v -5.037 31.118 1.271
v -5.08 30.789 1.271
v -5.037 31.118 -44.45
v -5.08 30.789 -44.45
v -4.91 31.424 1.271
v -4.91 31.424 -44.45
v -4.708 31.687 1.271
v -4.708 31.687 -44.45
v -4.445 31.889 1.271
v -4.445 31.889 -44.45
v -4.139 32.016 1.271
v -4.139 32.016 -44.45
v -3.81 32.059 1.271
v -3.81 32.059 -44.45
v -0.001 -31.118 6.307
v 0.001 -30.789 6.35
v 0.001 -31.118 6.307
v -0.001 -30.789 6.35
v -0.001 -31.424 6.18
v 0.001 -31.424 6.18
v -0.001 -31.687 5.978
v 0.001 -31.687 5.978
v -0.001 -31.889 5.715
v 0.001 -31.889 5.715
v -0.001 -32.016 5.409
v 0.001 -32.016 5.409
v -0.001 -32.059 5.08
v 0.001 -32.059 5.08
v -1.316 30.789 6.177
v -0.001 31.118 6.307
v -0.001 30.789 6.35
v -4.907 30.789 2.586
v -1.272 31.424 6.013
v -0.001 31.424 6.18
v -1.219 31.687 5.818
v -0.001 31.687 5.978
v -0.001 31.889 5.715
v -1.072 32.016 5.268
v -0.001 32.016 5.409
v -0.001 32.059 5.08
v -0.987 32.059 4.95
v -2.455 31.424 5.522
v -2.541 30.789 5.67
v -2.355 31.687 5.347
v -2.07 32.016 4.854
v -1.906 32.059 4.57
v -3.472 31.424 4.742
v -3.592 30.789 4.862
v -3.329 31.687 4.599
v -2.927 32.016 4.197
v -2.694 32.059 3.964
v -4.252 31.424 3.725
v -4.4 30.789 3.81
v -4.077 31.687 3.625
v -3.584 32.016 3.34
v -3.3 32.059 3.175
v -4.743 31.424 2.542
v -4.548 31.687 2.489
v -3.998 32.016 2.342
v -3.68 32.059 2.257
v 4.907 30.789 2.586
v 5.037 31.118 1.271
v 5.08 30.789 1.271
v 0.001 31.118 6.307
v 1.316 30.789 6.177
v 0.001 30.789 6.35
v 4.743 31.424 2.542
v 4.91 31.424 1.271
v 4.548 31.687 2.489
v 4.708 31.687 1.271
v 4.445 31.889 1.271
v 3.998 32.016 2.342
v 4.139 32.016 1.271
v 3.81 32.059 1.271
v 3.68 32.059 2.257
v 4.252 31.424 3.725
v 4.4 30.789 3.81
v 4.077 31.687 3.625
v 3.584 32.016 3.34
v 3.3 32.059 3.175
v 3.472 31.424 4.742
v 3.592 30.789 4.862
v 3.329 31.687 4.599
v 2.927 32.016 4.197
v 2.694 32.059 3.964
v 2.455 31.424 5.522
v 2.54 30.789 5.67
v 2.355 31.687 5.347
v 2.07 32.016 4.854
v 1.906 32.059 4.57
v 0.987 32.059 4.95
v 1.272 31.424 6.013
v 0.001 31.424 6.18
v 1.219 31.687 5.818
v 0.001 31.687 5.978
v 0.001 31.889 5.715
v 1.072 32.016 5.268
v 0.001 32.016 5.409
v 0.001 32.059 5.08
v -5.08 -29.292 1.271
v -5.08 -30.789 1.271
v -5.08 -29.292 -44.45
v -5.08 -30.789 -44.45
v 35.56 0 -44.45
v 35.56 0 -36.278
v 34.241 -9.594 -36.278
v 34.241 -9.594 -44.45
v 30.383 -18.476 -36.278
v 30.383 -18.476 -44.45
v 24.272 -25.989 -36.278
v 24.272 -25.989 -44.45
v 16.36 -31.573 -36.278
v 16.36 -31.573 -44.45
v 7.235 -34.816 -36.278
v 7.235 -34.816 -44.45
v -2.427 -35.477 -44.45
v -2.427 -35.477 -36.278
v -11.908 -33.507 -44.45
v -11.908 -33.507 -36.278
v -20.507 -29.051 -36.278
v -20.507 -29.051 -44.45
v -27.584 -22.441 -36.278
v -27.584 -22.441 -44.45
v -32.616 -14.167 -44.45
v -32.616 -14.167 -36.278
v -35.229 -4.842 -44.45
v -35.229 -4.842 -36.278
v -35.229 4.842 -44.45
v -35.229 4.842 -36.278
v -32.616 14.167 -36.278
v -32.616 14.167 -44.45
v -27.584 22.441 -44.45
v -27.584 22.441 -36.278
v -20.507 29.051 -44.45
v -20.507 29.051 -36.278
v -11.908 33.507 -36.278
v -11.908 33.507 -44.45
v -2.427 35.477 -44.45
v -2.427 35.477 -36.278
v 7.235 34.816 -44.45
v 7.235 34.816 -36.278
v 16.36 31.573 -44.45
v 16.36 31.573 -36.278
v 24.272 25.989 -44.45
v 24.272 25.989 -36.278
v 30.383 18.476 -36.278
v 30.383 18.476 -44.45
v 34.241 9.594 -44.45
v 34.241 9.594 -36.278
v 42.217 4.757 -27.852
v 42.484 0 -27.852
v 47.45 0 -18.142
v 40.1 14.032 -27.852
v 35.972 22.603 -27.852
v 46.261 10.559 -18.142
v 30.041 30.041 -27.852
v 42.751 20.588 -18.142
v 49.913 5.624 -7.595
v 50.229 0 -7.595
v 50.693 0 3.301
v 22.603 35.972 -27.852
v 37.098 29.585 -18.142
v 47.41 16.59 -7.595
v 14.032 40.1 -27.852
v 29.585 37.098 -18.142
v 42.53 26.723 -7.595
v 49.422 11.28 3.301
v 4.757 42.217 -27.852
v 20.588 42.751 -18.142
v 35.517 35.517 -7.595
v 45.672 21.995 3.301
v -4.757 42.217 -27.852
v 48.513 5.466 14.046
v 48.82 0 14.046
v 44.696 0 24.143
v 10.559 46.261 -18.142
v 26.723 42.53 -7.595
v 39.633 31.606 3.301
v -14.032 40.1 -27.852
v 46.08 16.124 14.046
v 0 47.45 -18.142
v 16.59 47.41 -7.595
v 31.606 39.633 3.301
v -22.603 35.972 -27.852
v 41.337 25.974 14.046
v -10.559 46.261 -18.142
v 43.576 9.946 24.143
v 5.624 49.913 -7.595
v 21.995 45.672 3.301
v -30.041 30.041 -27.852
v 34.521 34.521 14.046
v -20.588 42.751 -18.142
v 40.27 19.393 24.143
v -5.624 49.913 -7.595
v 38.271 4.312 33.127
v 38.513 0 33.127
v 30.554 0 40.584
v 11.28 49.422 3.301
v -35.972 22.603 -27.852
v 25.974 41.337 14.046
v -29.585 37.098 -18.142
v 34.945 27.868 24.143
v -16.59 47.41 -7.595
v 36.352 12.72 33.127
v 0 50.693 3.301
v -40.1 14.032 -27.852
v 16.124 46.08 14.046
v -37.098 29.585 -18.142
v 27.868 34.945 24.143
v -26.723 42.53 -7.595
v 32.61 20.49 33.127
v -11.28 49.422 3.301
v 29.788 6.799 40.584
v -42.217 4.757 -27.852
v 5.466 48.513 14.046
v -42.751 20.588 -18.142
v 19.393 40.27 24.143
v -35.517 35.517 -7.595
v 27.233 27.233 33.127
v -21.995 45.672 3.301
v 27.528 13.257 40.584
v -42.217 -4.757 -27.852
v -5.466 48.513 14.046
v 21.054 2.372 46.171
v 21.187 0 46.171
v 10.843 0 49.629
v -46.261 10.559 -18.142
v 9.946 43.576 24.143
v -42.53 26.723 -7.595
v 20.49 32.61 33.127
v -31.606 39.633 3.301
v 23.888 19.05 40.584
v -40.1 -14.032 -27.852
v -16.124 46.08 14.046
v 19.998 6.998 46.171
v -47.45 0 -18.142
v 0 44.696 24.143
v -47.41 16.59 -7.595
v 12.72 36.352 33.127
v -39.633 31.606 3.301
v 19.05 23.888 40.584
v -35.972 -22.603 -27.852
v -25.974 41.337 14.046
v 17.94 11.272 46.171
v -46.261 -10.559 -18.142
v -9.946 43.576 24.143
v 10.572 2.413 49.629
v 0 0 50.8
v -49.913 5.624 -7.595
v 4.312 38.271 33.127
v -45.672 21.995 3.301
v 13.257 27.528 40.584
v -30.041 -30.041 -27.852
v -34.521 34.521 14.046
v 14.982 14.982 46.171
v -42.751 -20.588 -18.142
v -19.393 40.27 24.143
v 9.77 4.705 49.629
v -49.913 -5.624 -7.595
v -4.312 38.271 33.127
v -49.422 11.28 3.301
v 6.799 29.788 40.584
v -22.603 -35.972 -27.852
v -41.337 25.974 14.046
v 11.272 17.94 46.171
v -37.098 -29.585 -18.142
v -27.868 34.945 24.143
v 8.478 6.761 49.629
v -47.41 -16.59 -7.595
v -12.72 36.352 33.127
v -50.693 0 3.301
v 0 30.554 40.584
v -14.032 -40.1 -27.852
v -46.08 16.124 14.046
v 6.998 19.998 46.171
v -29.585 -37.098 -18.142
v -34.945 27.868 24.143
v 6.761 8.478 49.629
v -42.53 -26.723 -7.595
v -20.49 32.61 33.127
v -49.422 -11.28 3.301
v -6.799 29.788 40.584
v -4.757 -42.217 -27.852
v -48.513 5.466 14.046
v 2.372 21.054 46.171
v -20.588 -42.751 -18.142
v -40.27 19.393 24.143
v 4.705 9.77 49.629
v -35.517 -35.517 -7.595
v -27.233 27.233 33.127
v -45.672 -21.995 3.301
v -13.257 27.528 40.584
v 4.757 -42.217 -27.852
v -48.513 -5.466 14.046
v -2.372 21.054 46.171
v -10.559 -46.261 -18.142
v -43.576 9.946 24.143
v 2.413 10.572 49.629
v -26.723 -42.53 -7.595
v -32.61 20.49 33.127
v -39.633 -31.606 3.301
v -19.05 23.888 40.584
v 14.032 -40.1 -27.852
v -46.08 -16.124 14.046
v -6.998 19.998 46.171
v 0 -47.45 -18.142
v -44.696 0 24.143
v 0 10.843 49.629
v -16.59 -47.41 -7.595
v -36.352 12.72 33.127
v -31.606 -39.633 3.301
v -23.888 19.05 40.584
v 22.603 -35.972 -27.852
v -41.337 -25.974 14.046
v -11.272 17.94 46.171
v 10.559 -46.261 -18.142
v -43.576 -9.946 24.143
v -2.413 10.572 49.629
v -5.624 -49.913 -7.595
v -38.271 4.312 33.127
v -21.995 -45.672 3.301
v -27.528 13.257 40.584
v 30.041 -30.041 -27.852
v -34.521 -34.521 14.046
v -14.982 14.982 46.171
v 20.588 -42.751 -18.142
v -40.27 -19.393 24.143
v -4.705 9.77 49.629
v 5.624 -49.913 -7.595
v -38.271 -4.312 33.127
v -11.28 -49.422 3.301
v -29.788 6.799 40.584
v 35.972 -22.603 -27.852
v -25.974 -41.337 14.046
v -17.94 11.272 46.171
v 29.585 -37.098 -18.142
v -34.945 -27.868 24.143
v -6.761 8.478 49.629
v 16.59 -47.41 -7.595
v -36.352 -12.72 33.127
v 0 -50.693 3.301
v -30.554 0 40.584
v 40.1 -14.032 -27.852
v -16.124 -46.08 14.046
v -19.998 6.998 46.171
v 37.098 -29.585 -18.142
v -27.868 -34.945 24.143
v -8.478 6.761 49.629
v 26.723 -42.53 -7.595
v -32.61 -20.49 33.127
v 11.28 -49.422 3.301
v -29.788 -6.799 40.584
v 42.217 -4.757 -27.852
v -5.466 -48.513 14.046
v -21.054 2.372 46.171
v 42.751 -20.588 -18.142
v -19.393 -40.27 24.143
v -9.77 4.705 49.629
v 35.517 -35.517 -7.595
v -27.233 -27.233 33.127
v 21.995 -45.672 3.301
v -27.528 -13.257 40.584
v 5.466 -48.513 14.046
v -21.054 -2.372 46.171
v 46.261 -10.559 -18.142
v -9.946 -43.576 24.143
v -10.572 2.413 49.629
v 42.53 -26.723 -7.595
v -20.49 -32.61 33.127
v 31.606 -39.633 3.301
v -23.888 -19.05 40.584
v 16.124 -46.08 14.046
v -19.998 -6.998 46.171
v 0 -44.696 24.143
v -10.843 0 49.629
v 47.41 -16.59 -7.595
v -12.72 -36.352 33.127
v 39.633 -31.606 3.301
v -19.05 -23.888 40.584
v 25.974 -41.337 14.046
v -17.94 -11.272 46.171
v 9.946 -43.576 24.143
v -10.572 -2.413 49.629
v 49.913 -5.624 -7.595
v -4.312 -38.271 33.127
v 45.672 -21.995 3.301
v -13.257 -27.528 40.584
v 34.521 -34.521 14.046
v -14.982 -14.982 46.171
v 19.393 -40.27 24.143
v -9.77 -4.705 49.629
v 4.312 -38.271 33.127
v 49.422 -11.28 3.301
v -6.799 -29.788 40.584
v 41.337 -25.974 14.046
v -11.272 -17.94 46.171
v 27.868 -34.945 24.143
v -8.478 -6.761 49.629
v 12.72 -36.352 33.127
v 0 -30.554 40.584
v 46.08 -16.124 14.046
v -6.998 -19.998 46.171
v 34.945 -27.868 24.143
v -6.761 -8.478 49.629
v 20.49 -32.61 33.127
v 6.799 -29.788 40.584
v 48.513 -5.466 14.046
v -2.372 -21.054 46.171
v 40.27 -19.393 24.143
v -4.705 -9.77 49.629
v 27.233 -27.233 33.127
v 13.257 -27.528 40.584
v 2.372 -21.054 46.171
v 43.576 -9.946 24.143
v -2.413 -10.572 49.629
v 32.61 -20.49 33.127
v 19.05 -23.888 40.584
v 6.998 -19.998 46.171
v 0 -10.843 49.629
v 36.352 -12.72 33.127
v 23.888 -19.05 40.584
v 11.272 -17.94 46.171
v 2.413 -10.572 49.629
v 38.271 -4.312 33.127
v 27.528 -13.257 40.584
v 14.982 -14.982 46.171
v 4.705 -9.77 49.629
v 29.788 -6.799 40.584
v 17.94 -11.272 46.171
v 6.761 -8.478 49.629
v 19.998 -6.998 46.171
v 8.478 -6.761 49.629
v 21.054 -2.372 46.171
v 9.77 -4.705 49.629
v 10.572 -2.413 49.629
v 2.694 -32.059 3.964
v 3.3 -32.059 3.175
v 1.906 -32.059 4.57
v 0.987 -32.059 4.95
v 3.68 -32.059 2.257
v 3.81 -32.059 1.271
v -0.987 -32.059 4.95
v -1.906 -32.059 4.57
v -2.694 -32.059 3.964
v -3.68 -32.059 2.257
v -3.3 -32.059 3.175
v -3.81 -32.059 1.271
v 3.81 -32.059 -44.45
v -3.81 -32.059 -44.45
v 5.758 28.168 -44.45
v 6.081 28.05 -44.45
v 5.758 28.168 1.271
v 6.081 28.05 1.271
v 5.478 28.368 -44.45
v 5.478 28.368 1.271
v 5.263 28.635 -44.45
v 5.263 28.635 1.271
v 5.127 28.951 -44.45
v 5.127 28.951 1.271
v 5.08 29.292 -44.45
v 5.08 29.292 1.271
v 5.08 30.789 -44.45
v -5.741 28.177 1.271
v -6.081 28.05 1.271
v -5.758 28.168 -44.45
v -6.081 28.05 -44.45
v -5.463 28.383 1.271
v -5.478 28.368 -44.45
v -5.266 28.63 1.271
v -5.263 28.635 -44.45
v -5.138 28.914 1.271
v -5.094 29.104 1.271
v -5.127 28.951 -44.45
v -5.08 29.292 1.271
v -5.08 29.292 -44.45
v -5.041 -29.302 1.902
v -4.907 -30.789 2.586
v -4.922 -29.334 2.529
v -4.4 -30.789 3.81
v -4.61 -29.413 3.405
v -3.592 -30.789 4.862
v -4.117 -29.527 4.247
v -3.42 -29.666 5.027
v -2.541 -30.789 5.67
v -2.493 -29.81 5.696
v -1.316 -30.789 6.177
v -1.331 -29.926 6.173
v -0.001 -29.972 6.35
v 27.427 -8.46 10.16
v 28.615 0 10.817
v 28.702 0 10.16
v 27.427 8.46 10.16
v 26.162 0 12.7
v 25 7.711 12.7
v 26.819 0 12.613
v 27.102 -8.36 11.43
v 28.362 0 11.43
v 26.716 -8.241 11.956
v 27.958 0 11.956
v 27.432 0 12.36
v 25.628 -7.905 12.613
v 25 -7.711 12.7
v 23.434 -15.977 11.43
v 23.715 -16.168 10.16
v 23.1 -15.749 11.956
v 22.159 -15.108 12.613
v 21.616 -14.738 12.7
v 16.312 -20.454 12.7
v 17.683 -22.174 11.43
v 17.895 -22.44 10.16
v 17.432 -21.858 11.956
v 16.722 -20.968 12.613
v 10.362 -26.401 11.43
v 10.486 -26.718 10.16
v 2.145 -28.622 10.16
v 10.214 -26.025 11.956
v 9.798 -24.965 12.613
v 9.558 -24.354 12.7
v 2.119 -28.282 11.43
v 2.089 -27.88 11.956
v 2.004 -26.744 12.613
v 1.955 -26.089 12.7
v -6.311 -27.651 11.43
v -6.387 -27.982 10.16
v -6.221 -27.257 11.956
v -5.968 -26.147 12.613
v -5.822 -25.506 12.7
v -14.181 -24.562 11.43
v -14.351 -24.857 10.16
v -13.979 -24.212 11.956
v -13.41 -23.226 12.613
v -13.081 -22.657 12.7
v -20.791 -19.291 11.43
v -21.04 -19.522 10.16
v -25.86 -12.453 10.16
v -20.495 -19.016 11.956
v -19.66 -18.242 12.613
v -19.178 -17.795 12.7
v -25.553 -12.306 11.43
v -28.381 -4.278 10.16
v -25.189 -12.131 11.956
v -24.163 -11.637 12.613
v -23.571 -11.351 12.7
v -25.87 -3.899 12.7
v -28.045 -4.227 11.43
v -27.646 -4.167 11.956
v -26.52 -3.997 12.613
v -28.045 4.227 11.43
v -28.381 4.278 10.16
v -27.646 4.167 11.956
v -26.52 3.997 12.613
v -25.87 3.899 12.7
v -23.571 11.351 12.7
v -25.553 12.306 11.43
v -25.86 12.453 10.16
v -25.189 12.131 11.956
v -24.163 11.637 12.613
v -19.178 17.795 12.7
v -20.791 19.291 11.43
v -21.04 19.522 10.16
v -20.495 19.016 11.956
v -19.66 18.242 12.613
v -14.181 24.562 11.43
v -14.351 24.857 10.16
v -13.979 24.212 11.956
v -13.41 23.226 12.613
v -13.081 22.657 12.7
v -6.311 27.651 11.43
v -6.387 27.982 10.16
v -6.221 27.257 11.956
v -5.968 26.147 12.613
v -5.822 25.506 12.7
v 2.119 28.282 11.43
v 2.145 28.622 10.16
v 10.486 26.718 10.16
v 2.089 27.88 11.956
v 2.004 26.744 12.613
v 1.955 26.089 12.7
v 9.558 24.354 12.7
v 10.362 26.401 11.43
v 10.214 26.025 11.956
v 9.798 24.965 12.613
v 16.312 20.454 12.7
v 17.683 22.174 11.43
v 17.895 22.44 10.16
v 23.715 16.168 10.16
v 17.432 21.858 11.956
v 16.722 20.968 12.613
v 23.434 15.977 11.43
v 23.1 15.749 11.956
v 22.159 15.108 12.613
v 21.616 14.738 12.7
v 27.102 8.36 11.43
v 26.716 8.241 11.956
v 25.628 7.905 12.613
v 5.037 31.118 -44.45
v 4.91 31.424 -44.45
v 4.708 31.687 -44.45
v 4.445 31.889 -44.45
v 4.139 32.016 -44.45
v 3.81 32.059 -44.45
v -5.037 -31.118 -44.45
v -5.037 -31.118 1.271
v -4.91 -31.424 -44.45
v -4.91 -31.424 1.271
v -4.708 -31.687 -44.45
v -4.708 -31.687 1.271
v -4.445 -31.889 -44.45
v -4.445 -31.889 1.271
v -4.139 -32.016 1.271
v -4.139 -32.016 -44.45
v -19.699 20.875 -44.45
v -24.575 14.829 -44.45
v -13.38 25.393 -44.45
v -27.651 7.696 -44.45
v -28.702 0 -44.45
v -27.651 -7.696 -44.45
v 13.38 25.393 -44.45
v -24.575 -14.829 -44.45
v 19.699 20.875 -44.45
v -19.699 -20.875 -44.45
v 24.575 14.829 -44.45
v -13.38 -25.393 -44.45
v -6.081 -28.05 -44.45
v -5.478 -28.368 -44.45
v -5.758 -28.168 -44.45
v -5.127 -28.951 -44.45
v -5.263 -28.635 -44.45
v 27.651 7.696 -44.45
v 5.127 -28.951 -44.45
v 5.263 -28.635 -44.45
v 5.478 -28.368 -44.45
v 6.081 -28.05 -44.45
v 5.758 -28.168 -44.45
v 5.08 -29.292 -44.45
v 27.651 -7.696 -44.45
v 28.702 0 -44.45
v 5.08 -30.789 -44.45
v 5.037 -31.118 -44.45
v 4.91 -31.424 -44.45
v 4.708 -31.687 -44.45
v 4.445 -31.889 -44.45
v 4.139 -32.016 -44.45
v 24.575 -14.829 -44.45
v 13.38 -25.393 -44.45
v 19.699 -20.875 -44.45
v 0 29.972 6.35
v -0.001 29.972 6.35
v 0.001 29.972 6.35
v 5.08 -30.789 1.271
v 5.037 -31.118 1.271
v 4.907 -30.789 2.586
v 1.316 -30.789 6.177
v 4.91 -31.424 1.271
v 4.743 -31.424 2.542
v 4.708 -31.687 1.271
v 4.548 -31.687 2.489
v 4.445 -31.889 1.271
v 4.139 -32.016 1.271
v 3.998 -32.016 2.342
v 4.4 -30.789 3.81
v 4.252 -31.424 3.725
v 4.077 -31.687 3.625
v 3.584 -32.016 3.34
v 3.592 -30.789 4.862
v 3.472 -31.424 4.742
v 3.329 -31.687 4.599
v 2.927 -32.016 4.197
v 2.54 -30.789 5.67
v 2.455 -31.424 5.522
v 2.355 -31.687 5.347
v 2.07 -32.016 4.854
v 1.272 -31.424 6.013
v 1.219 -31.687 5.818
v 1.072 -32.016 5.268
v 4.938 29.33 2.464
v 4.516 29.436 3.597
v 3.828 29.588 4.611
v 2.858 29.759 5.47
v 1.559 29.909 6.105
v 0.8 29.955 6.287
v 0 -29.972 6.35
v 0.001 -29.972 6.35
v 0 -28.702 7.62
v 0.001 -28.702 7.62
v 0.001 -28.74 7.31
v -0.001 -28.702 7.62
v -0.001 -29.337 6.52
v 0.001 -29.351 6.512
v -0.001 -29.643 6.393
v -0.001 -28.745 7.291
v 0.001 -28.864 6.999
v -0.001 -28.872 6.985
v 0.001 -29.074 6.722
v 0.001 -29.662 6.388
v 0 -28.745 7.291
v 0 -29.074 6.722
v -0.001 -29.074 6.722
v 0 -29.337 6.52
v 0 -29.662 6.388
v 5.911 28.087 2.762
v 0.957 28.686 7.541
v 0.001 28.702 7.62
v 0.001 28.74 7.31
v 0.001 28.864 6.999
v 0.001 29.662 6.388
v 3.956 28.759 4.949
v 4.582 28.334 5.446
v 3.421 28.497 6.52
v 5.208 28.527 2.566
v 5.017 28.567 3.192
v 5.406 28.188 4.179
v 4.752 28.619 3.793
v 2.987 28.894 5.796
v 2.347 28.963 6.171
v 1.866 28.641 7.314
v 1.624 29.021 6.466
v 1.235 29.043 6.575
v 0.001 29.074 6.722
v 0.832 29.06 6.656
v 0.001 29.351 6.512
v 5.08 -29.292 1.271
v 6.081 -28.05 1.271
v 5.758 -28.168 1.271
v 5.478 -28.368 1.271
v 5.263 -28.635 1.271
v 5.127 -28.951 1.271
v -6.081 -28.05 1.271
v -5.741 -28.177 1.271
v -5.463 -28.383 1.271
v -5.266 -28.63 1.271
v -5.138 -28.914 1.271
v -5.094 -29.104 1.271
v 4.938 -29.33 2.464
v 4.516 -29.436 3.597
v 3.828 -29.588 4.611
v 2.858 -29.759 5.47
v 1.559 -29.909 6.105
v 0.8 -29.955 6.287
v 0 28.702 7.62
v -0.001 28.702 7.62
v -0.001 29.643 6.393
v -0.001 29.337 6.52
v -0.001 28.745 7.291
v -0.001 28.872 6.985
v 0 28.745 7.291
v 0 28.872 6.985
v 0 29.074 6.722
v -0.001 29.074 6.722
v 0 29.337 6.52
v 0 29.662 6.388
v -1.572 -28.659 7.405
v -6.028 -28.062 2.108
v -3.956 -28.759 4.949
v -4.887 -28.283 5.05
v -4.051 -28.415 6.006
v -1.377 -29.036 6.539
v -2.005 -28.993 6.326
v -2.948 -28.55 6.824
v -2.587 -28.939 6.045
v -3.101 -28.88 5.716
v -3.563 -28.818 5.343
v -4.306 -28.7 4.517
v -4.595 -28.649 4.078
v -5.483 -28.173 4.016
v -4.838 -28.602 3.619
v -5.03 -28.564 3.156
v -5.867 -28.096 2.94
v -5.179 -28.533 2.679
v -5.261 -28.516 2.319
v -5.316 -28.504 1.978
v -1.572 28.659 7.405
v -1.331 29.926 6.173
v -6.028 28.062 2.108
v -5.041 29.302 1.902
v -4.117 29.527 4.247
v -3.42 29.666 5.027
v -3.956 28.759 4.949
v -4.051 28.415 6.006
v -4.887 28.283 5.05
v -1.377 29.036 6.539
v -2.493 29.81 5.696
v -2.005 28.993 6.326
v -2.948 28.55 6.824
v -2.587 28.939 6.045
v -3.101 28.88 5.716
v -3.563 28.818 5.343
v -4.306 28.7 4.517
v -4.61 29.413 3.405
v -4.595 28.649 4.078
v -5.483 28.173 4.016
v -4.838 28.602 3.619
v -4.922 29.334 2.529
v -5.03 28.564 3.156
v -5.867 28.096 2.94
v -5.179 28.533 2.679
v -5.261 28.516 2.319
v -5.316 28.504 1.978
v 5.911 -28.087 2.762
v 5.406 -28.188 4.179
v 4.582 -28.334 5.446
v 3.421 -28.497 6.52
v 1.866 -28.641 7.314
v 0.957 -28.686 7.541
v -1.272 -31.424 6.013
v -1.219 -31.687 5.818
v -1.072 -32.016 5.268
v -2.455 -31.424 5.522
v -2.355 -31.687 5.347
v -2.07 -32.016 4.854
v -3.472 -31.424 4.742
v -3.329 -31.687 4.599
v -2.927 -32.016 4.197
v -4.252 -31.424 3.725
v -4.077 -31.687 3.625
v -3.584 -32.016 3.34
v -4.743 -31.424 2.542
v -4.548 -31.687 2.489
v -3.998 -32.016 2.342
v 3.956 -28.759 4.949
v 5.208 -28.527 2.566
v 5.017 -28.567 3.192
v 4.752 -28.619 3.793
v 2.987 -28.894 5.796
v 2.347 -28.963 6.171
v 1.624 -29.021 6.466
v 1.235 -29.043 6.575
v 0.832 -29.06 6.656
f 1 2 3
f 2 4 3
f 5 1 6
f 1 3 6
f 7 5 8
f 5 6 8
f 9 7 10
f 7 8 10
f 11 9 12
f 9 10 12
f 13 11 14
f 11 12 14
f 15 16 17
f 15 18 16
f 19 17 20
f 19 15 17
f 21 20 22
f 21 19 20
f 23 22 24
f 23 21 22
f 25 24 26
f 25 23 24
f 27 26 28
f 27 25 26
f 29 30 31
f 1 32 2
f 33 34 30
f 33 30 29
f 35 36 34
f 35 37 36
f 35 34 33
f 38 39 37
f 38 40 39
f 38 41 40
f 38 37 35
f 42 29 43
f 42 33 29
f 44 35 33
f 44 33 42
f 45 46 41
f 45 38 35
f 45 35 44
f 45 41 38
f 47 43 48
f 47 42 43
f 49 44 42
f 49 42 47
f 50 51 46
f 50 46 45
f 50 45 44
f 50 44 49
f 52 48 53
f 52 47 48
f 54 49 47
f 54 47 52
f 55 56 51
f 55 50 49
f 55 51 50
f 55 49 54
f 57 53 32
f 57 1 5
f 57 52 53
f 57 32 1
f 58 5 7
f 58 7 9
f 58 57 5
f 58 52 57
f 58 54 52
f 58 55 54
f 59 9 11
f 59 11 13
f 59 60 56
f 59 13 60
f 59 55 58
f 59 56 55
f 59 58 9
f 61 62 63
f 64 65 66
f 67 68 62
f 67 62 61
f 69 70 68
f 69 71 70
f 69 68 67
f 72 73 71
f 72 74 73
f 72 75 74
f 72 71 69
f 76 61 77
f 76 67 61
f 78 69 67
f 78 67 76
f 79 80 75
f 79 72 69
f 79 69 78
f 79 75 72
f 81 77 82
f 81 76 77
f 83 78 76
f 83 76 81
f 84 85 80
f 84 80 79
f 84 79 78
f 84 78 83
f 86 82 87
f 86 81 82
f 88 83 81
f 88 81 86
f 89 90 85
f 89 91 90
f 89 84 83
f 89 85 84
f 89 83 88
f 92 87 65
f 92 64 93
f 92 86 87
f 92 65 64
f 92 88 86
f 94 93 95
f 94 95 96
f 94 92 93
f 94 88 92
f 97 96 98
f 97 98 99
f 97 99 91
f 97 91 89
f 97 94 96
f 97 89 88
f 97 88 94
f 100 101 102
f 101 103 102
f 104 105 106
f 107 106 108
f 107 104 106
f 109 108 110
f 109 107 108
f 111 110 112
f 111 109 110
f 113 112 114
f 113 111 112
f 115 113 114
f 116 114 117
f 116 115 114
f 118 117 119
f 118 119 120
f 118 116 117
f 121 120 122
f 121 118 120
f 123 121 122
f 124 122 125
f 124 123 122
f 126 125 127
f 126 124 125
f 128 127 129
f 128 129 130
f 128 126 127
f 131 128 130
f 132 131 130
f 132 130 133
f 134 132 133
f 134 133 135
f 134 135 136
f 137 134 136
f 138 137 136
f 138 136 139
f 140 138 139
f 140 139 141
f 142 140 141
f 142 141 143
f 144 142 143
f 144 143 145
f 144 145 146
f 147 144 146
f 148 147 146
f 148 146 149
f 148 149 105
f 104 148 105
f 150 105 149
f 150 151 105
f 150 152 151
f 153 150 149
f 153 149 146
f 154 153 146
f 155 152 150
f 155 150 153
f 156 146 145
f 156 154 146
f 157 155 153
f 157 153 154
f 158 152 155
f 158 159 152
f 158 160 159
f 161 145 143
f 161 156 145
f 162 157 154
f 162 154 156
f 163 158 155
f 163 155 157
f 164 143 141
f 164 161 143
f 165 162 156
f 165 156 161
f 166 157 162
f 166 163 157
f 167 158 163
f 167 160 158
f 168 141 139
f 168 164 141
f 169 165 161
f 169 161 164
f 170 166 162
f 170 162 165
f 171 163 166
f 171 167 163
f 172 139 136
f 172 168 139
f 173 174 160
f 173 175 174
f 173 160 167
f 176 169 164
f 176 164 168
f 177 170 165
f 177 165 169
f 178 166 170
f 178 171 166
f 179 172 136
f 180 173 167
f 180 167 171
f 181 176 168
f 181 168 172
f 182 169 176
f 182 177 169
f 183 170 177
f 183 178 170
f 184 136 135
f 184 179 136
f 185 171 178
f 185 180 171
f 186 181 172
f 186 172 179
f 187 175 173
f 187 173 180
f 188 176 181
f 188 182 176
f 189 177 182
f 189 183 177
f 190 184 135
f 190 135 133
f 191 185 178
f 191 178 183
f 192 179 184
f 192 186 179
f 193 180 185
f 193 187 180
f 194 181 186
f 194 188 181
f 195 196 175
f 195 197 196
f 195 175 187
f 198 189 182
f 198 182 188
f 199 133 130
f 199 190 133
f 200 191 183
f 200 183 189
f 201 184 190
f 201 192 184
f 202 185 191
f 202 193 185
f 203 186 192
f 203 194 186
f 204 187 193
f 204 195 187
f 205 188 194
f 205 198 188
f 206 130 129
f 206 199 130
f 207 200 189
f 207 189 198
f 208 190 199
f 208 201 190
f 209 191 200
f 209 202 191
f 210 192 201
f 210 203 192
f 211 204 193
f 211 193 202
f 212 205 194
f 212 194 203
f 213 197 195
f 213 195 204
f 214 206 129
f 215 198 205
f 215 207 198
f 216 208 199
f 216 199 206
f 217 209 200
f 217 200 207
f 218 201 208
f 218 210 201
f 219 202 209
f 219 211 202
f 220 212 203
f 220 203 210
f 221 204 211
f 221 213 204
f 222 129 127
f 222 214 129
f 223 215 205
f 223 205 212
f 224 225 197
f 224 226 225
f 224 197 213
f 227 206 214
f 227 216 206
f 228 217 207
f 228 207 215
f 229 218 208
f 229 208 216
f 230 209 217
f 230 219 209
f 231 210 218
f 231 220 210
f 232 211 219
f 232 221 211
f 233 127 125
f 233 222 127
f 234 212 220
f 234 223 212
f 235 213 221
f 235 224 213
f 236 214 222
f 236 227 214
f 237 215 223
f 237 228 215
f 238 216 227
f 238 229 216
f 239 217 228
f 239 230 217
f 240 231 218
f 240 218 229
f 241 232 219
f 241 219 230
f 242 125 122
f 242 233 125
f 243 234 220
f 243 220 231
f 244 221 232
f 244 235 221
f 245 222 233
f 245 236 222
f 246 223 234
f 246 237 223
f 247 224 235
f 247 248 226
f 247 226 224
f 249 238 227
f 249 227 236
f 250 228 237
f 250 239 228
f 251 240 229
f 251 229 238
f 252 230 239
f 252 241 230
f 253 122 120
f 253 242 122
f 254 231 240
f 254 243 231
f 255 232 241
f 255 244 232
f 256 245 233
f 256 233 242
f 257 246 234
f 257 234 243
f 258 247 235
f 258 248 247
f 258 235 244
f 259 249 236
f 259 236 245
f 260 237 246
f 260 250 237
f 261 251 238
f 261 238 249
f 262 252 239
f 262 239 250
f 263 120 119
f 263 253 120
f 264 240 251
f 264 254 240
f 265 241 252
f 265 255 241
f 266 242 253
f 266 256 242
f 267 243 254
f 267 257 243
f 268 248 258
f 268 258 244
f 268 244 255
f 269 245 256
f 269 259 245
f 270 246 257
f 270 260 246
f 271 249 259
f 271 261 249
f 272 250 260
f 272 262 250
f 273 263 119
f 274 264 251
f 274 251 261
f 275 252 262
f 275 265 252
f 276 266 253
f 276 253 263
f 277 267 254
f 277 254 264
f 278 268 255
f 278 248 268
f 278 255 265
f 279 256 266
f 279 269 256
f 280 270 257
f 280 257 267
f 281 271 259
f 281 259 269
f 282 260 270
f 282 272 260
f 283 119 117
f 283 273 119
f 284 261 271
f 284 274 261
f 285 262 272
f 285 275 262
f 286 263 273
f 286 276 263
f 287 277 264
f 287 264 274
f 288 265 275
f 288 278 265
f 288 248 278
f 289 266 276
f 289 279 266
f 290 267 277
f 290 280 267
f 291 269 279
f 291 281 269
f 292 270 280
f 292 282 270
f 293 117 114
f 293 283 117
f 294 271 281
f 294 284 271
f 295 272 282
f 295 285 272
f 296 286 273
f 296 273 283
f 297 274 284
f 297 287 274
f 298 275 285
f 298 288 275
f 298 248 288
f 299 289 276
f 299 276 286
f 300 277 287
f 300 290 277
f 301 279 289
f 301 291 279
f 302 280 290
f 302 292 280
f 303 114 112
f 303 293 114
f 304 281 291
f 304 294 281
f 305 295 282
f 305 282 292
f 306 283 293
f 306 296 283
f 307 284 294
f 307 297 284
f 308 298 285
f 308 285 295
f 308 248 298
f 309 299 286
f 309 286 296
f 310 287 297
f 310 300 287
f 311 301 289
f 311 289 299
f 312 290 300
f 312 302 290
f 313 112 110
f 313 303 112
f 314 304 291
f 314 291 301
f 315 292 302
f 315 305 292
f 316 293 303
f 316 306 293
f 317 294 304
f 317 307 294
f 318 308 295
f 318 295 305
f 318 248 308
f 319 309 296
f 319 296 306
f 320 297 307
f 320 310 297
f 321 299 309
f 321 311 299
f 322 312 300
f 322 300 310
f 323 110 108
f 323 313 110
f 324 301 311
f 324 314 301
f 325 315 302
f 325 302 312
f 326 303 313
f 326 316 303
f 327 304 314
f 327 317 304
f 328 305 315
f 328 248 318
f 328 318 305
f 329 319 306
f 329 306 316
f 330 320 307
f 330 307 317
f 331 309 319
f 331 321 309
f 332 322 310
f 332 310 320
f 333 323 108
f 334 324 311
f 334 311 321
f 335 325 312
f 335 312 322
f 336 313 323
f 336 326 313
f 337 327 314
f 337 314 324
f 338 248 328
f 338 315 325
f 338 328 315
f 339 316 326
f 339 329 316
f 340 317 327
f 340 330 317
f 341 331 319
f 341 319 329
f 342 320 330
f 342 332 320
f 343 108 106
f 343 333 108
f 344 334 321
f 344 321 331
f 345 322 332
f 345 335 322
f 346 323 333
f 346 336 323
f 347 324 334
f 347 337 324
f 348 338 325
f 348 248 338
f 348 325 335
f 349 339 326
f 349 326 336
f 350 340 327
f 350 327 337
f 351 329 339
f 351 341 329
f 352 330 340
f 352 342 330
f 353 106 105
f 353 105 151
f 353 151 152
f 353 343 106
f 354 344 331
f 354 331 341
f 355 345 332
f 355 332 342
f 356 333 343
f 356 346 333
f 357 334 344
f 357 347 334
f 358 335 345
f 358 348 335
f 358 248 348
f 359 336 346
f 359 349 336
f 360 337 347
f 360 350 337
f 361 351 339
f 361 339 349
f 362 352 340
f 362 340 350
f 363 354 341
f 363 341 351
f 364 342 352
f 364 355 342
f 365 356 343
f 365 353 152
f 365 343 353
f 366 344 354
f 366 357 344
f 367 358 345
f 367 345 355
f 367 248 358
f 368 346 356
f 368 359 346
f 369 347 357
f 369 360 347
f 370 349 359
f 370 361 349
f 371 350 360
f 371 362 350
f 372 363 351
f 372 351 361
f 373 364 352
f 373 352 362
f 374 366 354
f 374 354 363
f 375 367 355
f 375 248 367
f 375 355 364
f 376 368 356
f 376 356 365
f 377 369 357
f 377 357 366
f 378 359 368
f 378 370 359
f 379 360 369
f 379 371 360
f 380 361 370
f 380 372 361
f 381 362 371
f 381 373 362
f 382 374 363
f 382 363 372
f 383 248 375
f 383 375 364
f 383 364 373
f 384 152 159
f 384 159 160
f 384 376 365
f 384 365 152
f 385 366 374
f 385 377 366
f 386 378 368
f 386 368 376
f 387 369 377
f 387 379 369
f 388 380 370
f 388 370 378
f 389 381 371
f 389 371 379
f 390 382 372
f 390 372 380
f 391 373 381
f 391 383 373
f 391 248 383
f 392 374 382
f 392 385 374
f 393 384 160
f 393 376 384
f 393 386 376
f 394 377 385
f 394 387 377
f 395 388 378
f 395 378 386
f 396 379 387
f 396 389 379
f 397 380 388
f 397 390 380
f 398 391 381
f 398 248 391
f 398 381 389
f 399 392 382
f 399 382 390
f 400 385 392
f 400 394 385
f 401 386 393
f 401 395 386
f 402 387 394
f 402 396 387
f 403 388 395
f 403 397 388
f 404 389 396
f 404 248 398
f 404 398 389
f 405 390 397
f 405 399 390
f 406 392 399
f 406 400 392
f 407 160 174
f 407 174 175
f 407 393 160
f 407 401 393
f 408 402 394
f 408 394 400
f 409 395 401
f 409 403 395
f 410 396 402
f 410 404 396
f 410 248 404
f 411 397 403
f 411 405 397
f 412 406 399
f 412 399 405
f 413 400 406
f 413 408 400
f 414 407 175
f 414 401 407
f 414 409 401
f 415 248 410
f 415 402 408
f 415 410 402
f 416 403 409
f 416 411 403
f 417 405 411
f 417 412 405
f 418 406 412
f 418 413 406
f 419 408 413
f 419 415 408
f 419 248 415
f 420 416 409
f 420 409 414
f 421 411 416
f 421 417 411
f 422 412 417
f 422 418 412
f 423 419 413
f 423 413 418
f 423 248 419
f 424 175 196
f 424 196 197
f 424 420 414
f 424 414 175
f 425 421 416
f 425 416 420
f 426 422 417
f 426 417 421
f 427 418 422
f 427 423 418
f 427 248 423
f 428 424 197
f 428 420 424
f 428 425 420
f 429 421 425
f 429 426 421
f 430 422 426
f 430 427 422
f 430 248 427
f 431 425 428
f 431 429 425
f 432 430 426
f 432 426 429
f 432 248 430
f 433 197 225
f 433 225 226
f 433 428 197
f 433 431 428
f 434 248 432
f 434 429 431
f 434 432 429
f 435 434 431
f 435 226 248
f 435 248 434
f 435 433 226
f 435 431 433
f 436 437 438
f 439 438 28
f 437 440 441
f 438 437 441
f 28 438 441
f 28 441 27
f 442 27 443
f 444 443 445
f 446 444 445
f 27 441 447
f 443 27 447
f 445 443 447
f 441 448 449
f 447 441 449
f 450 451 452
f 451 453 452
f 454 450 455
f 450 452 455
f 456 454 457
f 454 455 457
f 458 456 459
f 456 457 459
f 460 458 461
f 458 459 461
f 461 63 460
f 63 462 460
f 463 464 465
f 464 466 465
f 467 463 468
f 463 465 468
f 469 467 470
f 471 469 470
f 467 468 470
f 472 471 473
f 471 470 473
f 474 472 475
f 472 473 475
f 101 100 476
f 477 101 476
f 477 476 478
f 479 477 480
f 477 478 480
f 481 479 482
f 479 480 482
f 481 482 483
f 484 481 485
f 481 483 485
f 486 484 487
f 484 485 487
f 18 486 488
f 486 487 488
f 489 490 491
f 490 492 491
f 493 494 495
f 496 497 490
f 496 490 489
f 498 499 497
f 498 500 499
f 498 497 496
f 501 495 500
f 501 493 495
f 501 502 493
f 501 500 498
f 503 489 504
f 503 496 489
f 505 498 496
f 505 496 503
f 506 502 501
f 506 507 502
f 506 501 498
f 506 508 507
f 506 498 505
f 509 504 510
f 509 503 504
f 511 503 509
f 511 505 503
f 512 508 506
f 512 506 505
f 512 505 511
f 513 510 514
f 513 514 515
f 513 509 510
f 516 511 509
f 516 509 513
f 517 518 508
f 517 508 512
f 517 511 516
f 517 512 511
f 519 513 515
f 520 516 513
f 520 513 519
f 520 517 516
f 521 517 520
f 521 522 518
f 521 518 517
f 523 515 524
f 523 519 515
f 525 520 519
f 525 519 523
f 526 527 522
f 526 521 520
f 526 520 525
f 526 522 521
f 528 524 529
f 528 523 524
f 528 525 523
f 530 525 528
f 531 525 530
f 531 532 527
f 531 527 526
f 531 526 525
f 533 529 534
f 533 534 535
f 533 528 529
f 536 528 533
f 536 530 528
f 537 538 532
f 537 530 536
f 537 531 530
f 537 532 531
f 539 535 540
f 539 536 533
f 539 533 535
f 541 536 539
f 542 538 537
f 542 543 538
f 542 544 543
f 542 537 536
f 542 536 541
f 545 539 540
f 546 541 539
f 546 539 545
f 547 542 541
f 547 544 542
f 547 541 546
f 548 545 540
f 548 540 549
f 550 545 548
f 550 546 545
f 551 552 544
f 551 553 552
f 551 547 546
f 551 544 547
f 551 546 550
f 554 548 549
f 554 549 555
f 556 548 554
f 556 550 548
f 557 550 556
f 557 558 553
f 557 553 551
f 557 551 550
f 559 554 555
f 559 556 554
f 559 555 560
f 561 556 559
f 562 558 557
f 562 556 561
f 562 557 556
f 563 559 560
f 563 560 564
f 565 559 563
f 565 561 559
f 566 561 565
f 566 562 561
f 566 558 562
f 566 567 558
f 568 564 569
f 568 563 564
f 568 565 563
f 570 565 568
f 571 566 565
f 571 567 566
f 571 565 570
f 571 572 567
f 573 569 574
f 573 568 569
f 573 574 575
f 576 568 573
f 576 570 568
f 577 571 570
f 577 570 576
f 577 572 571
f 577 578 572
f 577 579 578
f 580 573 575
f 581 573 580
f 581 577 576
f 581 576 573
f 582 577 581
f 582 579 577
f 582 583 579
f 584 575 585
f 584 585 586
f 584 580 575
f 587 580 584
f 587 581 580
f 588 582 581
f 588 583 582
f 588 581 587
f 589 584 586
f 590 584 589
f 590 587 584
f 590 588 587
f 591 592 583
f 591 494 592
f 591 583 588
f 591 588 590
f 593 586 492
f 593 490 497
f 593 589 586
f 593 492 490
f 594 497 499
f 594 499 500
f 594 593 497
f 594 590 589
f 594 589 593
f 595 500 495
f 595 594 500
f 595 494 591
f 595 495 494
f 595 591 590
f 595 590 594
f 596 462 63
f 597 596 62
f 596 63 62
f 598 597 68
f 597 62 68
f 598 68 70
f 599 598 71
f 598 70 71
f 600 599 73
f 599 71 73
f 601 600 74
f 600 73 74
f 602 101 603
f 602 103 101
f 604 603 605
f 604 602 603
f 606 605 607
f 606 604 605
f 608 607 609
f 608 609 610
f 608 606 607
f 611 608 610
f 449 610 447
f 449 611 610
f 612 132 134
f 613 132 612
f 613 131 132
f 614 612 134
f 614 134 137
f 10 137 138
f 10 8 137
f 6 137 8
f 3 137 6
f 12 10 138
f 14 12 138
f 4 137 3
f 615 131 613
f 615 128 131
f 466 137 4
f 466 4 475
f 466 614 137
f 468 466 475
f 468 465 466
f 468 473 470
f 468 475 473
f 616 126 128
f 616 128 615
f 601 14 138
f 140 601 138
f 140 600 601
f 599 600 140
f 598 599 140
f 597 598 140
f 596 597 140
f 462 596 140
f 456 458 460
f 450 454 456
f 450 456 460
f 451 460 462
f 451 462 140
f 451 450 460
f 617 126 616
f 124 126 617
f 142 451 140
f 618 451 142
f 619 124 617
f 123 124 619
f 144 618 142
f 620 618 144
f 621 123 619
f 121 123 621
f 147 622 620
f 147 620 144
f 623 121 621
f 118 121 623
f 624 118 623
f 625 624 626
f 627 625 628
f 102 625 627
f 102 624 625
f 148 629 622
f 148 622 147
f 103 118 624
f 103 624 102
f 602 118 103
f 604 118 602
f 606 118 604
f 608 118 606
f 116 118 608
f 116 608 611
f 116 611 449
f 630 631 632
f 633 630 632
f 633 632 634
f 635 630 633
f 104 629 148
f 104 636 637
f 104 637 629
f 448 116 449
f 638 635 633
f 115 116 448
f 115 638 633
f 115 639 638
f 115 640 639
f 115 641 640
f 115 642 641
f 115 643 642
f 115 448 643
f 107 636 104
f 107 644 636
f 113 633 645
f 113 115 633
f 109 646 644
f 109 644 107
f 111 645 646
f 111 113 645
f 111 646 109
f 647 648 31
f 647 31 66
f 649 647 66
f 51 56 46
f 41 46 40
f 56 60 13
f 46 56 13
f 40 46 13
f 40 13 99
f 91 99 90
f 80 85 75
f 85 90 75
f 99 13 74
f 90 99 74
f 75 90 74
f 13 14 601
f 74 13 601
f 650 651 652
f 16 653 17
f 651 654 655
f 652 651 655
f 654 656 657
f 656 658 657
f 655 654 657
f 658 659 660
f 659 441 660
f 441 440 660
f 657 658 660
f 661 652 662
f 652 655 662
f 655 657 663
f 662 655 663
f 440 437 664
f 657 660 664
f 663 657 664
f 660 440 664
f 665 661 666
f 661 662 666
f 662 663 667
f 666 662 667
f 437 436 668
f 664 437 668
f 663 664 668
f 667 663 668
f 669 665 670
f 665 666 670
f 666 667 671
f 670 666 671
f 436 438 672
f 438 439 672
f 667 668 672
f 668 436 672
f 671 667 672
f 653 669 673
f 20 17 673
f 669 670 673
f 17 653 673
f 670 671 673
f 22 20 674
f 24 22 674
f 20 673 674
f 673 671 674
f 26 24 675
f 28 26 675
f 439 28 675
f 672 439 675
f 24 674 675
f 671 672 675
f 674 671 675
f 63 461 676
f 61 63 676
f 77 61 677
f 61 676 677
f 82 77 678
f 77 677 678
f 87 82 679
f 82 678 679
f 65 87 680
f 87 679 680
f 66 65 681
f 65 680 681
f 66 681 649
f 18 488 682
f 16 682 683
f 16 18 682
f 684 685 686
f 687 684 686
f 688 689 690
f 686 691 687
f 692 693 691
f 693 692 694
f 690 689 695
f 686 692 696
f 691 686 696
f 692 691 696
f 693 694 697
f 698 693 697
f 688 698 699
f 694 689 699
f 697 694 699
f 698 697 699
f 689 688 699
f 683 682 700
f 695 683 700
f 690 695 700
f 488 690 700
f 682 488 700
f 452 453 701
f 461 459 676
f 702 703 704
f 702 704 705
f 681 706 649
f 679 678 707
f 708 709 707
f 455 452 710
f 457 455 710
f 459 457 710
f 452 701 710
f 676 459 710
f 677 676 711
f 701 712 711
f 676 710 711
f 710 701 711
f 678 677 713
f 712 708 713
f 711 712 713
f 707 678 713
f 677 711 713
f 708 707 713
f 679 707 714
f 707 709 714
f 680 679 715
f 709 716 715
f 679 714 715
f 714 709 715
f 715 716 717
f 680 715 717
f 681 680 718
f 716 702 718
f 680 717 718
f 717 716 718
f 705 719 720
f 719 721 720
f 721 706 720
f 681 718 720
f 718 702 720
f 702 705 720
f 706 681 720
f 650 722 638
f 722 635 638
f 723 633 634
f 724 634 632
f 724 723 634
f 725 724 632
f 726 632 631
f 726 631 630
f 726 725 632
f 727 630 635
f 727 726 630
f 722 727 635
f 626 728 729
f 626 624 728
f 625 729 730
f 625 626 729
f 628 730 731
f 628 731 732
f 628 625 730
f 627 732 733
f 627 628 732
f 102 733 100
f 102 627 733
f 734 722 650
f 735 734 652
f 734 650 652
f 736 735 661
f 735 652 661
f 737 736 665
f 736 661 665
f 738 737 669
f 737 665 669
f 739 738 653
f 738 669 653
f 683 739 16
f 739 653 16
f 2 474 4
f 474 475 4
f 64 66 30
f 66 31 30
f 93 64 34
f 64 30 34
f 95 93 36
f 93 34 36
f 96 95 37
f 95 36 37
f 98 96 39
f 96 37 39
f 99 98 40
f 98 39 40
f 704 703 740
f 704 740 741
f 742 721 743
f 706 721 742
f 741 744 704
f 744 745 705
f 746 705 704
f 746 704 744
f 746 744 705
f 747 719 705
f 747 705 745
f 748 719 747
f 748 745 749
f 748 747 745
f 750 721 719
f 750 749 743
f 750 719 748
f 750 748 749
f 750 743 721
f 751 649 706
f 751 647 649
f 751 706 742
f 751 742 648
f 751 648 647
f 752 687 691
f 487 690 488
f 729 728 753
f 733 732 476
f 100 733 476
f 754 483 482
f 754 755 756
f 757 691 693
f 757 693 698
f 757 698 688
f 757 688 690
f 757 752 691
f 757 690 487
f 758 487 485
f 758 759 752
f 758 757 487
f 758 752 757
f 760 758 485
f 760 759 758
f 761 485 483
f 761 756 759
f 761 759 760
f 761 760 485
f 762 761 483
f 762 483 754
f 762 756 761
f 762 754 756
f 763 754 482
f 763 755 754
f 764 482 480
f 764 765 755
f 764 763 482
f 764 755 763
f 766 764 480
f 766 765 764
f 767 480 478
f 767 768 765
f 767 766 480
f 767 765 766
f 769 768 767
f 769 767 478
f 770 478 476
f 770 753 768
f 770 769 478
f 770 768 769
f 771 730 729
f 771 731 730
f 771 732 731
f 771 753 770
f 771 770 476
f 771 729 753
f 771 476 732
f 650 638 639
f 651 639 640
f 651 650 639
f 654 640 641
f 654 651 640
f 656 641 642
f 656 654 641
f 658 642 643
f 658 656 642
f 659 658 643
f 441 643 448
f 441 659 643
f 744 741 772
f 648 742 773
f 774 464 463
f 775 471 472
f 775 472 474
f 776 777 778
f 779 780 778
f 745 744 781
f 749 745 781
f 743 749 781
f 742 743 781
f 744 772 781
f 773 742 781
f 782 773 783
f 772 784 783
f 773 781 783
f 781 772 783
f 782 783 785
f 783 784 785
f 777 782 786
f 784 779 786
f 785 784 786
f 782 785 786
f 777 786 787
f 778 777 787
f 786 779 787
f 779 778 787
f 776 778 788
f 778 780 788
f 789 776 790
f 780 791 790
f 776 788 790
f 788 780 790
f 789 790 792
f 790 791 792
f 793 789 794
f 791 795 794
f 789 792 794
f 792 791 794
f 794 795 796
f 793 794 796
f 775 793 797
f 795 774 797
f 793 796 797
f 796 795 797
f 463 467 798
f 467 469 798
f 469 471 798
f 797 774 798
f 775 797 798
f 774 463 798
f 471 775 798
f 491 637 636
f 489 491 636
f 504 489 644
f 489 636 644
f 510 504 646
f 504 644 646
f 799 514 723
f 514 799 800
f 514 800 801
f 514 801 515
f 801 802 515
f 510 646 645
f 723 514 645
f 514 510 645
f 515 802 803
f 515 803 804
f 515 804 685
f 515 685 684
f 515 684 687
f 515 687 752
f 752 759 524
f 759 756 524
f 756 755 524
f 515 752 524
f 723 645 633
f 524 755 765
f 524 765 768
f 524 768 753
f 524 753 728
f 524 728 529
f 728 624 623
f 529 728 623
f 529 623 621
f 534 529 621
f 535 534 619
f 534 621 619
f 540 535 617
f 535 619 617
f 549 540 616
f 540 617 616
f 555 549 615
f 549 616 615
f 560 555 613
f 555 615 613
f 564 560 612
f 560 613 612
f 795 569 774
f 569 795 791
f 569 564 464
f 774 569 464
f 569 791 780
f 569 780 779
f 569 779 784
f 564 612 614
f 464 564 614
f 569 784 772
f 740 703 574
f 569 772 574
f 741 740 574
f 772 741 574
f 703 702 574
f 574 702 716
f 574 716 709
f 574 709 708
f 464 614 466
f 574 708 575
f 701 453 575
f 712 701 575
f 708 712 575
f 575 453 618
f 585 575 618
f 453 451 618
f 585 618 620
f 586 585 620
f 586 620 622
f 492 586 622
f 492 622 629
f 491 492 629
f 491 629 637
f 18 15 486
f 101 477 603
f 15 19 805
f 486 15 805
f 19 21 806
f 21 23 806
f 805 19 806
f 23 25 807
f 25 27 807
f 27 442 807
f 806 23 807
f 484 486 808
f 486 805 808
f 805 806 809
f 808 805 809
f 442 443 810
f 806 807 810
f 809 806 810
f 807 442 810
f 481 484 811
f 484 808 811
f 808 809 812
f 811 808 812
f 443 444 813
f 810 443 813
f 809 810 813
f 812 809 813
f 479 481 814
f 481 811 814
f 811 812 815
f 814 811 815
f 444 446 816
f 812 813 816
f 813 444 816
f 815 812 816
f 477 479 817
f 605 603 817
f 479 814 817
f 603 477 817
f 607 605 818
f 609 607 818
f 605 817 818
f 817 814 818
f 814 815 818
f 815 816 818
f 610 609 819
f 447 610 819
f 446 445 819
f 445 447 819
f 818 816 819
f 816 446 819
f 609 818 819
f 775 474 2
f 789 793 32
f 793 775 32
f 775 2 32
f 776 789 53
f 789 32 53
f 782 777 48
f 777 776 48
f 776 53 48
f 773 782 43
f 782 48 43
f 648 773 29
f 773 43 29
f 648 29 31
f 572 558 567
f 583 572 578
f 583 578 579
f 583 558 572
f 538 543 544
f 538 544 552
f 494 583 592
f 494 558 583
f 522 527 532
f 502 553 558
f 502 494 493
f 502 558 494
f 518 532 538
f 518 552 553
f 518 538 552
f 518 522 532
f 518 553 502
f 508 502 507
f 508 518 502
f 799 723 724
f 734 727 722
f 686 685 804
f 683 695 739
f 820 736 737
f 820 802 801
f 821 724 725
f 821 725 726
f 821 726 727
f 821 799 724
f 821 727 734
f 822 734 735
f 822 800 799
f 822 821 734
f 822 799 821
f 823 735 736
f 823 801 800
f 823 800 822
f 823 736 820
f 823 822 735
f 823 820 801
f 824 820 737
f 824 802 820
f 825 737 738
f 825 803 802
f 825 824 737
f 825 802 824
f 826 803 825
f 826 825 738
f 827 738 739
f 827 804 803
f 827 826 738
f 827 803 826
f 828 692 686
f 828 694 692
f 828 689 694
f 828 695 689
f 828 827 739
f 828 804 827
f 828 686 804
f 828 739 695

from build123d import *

# Parameters (mm, degrees)
F3_R      = 128.0515086977
F4_DEPTH  = 25.4
F5_R      = 35.56
F6_DEPTH  = 25.4
F7_R      = 28.702
F8_DEPTH  = 57.15
F10_DEPTH = 50.8
F11_R     = 5.079
F12_R     = 1.27
F13_R     = 2.54


# Not quite as in the source:
# - a fillet or chamfer is up to 0.001 mm smaller than in the source, because OpenCascade refuses the exact size


with BuildPart() as f1:
    # F0 (on Front) → F1 (revolve)
    with BuildSketch(Plane.XZ):
        with BuildLine():
            Line((0, 0), (0, -50.8))
            ThreePointArc((0, -50.8), (50.8, 0), (0, 50.8))
            Line((0, 50.8), (0, 0))
        make_face()
    revolve(axis=Axis((0, 0, 25.4), (0, 0, 1)))

    # F3 (on offset) → F4 (cut)
    with BuildSketch(Plane.XY.offset(-44.45)):
        with Locations((0, 3.5303835757)):
            Circle(F3_R)
    extrude(amount=-F4_DEPTH, mode=Mode.SUBTRACT)

    # F5 (on face) → F6 (join)
    with BuildSketch(Plane(origin=(0, 0, -44.45), x_dir=(1, 0, 0), z_dir=(0, 0, -1))):
        Circle(F5_R)
    extrude(amount=-F6_DEPTH)

    # F7 (on face) → F8 (cut)
    with BuildSketch(Plane(origin=(0, 0, -44.45), x_dir=(1, 0, 0), z_dir=(0, 0, -1))):
        Circle(F7_R)
    extrude(amount=-F8_DEPTH, mode=Mode.SUBTRACT)

    # F9 (on face) → F10 (cut)
    with BuildSketch(Plane(origin=(0, 0, -44.45), x_dir=(1, 0, 0), z_dir=(0, 0, -1))):
        with BuildLine():
            ThreePointArc((-5.08, 28.2488655347), (-2.5500848439, 28.588491938), (0, 28.702))
            Line((0, 28.702), (0, 32.0588655347))
            Line((0, 32.0588655347), (-5.08, 32.0588655347))
            Line((-5.08, 32.0588655347), (-5.08, 28.2488655347))
        make_face()
        with BuildLine():
            ThreePointArc((0, 28.702), (2.5500848439, 28.588491938), (5.08, 28.2488655347))
            Line((5.08, 28.2488655347), (5.08, 32.0588655347))
            Line((5.08, 32.0588655347), (0, 32.0588655347))
            Line((0, 32.0588655347), (0, 28.702))
        make_face()
        with BuildLine():
            Line((5.08, -32.0588655347), (5.08, -28.2488655347))
            ThreePointArc((5.08, -28.2488655347), (0, -28.702), (-5.08, -28.2488655347))
            Line((-5.08, -28.2488655347), (-5.08, -32.0588655347))
            Line((-5.08, -32.0588655347), (0, -32.0588655347))
            Line((0, -32.0588655347), (5.08, -32.0588655347))
        make_face()
    extrude(amount=-F10_DEPTH, mode=Mode.SUBTRACT)

    # F11 (radius 5.08 in the source; OpenCascade refuses exactly that, so slightly less here)
    f11_edges = [f1.edges().sort_by_distance(p)[0] for p in [
        (-5.08, -30.153866, 6.35),
        (5.08, -30.153866, 6.35),
        (5.08, 30.153866, 6.35),
        (-5.08, 30.153866, 6.35),
    ]]
    fillet(f11_edges, radius=F11_R)

    # F12
    f12_edges = [f1.edges().sort_by_distance(p)[0] for p in [
        (5.08, 28.248866, -21.5895),
        (5.08, 32.058866, -21.5895),
        (5.08, -32.058866, -21.5895),
        (5.08, -28.248866, -21.5895),
    ]]
    fillet(f12_edges, radius=F12_R)

    # F13
    f13_edges = [f1.edges().sort_by_distance(p)[0] for p in [
        (-28.702, 0, 12.7),
    ]]
    fillet(f13_edges, radius=F13_R)


solid = f1.part
